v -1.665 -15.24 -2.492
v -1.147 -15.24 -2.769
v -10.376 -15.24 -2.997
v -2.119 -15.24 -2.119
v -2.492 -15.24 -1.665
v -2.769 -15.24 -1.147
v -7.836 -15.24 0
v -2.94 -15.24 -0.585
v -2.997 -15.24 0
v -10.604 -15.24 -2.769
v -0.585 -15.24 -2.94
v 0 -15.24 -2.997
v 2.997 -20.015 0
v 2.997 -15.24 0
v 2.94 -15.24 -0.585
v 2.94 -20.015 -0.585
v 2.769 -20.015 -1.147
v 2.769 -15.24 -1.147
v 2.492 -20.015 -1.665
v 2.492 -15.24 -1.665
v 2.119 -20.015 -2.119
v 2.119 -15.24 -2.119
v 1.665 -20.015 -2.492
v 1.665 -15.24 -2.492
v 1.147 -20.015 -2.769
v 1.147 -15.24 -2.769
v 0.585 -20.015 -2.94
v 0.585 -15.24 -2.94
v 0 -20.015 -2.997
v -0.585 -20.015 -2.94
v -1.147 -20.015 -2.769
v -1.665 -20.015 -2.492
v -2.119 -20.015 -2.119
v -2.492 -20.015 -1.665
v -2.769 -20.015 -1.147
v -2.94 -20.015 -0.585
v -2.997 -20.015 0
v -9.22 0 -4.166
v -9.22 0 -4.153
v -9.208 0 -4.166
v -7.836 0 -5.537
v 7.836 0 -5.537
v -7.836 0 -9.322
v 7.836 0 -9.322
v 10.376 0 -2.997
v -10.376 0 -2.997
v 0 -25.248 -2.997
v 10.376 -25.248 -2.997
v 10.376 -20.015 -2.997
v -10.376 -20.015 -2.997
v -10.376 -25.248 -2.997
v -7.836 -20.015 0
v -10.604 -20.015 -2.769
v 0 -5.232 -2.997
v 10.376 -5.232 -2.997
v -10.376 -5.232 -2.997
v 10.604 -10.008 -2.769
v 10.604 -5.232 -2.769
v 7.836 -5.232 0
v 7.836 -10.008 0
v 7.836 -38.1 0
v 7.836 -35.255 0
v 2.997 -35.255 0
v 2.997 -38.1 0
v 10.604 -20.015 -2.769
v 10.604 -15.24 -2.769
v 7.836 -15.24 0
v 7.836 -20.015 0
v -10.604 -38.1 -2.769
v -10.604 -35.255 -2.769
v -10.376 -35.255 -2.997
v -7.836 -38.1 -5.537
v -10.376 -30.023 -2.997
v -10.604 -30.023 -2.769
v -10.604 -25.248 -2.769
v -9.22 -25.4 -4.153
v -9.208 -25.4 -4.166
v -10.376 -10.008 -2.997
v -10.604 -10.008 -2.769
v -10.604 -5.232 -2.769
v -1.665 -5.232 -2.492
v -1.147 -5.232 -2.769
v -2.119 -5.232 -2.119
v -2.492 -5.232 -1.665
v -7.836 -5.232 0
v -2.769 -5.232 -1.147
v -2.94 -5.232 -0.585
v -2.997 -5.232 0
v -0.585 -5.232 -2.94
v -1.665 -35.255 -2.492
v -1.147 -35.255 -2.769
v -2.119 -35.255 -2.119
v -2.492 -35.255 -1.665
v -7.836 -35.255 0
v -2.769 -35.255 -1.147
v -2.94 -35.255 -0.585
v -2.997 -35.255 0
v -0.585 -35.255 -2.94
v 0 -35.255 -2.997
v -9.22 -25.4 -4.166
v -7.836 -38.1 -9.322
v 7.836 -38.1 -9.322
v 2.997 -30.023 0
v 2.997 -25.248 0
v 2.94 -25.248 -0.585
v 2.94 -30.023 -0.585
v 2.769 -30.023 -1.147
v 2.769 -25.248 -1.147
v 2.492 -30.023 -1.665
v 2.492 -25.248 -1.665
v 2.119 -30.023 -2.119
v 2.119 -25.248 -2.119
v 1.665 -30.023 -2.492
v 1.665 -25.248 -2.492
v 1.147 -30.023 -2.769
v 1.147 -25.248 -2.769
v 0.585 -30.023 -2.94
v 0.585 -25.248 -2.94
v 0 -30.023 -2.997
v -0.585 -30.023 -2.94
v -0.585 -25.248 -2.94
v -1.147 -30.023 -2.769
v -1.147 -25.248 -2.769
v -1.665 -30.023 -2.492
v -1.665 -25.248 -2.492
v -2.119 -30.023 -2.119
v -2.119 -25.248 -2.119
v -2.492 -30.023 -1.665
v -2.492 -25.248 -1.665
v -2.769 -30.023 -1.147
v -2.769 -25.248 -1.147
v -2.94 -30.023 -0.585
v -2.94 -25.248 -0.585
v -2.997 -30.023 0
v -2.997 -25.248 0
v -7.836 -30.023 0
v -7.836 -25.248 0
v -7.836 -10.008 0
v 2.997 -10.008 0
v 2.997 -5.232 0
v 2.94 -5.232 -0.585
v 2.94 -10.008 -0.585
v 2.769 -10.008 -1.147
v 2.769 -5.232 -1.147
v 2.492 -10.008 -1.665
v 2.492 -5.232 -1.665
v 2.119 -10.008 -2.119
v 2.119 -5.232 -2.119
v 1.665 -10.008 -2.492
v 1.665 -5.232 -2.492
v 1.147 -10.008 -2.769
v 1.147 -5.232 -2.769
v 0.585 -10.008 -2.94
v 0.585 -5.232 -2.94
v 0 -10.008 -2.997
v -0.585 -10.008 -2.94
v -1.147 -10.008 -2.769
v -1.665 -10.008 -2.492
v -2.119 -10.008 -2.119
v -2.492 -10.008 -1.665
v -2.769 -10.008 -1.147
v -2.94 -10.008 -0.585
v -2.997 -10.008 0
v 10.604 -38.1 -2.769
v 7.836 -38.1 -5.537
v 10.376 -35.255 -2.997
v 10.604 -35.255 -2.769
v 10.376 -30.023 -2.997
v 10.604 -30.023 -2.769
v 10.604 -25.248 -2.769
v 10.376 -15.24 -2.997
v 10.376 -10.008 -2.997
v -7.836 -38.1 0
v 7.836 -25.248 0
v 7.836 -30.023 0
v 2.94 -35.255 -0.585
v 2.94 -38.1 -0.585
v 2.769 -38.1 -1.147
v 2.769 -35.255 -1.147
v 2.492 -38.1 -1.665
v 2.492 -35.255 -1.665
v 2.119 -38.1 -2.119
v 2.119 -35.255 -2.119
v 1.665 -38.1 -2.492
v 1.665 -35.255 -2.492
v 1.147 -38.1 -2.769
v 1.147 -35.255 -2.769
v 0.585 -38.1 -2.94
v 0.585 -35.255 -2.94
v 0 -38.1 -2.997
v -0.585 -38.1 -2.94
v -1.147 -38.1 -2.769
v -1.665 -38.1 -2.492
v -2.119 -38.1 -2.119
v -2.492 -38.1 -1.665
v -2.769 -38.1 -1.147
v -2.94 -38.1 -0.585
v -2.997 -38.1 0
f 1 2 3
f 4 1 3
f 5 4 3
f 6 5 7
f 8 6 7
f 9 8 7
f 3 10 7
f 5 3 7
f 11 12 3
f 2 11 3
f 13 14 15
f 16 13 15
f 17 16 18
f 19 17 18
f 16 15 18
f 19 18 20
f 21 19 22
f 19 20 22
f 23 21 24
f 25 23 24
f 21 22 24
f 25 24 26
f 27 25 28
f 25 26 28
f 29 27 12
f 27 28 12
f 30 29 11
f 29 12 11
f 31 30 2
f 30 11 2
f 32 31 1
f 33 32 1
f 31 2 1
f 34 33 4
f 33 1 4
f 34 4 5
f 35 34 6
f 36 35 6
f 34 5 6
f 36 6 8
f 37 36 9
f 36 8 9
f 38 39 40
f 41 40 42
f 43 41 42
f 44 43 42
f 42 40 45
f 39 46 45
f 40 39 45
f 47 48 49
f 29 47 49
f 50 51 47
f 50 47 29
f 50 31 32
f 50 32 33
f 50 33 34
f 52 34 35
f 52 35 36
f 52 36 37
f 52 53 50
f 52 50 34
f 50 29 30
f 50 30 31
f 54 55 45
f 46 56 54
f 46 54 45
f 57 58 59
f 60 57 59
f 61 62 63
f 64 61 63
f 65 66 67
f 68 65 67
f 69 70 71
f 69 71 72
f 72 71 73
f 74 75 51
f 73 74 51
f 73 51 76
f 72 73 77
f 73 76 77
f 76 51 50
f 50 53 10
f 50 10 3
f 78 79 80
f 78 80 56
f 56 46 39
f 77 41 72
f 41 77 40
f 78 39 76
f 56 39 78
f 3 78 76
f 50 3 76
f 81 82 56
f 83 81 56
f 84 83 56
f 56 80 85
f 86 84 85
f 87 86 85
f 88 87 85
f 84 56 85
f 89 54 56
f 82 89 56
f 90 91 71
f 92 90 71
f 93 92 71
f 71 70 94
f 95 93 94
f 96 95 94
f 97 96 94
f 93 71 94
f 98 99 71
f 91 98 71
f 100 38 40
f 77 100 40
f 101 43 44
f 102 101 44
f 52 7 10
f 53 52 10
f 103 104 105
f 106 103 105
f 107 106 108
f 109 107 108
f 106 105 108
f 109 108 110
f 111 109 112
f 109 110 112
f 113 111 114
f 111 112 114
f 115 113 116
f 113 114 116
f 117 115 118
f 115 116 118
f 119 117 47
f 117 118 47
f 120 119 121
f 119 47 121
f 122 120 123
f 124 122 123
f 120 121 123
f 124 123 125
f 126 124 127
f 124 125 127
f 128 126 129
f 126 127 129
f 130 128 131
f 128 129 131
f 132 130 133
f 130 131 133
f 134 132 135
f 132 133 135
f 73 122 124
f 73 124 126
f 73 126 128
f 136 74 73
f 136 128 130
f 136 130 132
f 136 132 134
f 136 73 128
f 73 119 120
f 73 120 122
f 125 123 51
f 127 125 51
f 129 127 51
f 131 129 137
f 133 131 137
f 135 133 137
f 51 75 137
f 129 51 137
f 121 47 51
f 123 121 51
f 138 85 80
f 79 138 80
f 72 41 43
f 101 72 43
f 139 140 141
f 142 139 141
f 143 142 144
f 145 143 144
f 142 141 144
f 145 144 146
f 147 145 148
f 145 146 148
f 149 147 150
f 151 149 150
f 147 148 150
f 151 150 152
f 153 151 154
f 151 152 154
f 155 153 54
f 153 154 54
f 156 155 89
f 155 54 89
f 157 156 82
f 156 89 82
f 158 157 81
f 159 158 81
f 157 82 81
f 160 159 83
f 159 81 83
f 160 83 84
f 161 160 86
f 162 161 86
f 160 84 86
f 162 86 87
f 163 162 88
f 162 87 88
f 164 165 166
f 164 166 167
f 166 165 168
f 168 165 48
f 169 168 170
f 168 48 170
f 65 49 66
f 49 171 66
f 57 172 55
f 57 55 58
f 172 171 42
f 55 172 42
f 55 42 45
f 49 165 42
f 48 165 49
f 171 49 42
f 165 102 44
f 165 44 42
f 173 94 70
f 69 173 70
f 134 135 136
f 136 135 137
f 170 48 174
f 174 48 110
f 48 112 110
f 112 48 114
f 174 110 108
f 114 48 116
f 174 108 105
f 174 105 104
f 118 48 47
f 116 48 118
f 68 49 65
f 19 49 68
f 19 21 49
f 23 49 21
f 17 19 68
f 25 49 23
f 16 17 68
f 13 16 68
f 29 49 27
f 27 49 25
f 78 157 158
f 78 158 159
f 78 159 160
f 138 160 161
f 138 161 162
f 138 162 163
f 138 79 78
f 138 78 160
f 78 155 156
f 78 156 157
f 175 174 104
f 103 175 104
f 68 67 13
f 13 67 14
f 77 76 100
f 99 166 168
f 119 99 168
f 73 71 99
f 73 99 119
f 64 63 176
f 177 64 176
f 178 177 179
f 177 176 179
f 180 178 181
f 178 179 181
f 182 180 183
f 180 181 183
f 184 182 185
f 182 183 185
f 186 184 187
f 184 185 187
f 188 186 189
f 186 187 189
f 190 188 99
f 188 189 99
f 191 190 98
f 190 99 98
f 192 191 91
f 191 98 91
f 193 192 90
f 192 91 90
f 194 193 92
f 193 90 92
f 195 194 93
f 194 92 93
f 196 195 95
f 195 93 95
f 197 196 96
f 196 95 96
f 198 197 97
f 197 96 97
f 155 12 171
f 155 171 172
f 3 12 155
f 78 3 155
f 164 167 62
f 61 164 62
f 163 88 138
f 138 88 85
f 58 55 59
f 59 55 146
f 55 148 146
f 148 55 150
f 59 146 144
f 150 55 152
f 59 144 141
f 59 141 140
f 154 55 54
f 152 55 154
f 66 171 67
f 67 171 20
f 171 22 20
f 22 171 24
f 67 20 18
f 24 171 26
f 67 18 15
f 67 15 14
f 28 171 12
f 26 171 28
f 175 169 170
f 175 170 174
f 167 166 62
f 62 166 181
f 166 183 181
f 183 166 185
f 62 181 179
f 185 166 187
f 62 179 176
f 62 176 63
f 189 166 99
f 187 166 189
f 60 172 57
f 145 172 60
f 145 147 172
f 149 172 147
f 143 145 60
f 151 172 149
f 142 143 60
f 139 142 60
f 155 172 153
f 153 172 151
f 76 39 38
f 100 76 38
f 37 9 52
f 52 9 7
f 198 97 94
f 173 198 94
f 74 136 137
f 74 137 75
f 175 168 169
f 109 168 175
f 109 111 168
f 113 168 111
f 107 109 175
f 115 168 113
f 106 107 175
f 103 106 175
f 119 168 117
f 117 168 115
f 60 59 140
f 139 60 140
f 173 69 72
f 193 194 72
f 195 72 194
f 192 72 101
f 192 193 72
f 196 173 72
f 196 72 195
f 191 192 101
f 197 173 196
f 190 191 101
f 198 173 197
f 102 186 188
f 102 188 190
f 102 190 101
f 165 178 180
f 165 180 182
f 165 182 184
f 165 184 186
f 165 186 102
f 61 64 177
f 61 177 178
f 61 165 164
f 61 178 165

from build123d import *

# Parameters (mm, degrees)
F1_DEPTH = 38.1
F2_DEPTH = 25.4
F3_W     = 5.2324
F3_H     = 2.9972
F3_W_2   = 2.6162
F4_DEPTH = 12.7
F5_R     = 2.9972
F6_DEPTH = 38.1


with BuildPart() as f1:
    # F0 (on Front) → F1 (new body)
    with BuildSketch(Plane.XZ):
        Polygon((7.8359, 0), (-7.8359, 0), (-10.6045, -2.7686), (-9.2202, -4.1529), (-9.2075, -4.1656), (-7.8359, -5.5372), (-7.8359, -9.3218), (7.8359, -9.3218), (7.8359, -5.5372), (10.6045, -2.7686), align=None)
    extrude(amount=F1_DEPTH)

    # F0 (on Front) → F2 (join)
    with BuildSketch(Plane.XZ):
        Polygon((7.8359, 0), (-7.8359, 0), (-10.6045, -2.7686), (-9.2202, -4.1529), (-9.2075, -4.1656), (-7.8359, -5.5372), (-7.8359, -9.3218), (7.8359, -9.3218), (7.8359, -5.5372), (10.6045, -2.7686), align=None)
        Polygon((-9.2075, -4.1656), (-9.2202, -4.1529), (-9.2202, -4.1656), align=None)
    extrude(amount=F2_DEPTH)

    # F3 (on Right) → F4 (cut, symmetric)
    with BuildSketch(Plane.YZ):
        with Locations((-2.6162, -1.4986)):
            Rectangle(F3_W, F3_H)
        with Locations((-11.3157, -1.4986)):
            Rectangle(F3_W_2, F3_H)
        with Locations((-13.9319, -1.4986)):
            Rectangle(F3_W_2, F3_H)
        with Locations((-21.3233, -1.4986)):
            Rectangle(F3_W_2, F3_H)
        with Locations((-23.9395, -1.4986)):
            Rectangle(F3_W_2, F3_H)
        with Locations((-32.639, -1.4986)):
            Rectangle(F3_W, F3_H)
        with Locations((-42.6466, -1.4986)):
            Rectangle(F3_W, F3_H)
    extrude(amount=F4_DEPTH, both=True, mode=Mode.SUBTRACT)

    # F5 (on face) → F6 (cut)
    with BuildSketch(Plane(origin=(0, 0, 0), x_dir=(-1, 0, 0), z_dir=(0, 1, 0))):
        Circle(F5_R)
    extrude(amount=-F6_DEPTH, mode=Mode.SUBTRACT)


solid = f1.part
